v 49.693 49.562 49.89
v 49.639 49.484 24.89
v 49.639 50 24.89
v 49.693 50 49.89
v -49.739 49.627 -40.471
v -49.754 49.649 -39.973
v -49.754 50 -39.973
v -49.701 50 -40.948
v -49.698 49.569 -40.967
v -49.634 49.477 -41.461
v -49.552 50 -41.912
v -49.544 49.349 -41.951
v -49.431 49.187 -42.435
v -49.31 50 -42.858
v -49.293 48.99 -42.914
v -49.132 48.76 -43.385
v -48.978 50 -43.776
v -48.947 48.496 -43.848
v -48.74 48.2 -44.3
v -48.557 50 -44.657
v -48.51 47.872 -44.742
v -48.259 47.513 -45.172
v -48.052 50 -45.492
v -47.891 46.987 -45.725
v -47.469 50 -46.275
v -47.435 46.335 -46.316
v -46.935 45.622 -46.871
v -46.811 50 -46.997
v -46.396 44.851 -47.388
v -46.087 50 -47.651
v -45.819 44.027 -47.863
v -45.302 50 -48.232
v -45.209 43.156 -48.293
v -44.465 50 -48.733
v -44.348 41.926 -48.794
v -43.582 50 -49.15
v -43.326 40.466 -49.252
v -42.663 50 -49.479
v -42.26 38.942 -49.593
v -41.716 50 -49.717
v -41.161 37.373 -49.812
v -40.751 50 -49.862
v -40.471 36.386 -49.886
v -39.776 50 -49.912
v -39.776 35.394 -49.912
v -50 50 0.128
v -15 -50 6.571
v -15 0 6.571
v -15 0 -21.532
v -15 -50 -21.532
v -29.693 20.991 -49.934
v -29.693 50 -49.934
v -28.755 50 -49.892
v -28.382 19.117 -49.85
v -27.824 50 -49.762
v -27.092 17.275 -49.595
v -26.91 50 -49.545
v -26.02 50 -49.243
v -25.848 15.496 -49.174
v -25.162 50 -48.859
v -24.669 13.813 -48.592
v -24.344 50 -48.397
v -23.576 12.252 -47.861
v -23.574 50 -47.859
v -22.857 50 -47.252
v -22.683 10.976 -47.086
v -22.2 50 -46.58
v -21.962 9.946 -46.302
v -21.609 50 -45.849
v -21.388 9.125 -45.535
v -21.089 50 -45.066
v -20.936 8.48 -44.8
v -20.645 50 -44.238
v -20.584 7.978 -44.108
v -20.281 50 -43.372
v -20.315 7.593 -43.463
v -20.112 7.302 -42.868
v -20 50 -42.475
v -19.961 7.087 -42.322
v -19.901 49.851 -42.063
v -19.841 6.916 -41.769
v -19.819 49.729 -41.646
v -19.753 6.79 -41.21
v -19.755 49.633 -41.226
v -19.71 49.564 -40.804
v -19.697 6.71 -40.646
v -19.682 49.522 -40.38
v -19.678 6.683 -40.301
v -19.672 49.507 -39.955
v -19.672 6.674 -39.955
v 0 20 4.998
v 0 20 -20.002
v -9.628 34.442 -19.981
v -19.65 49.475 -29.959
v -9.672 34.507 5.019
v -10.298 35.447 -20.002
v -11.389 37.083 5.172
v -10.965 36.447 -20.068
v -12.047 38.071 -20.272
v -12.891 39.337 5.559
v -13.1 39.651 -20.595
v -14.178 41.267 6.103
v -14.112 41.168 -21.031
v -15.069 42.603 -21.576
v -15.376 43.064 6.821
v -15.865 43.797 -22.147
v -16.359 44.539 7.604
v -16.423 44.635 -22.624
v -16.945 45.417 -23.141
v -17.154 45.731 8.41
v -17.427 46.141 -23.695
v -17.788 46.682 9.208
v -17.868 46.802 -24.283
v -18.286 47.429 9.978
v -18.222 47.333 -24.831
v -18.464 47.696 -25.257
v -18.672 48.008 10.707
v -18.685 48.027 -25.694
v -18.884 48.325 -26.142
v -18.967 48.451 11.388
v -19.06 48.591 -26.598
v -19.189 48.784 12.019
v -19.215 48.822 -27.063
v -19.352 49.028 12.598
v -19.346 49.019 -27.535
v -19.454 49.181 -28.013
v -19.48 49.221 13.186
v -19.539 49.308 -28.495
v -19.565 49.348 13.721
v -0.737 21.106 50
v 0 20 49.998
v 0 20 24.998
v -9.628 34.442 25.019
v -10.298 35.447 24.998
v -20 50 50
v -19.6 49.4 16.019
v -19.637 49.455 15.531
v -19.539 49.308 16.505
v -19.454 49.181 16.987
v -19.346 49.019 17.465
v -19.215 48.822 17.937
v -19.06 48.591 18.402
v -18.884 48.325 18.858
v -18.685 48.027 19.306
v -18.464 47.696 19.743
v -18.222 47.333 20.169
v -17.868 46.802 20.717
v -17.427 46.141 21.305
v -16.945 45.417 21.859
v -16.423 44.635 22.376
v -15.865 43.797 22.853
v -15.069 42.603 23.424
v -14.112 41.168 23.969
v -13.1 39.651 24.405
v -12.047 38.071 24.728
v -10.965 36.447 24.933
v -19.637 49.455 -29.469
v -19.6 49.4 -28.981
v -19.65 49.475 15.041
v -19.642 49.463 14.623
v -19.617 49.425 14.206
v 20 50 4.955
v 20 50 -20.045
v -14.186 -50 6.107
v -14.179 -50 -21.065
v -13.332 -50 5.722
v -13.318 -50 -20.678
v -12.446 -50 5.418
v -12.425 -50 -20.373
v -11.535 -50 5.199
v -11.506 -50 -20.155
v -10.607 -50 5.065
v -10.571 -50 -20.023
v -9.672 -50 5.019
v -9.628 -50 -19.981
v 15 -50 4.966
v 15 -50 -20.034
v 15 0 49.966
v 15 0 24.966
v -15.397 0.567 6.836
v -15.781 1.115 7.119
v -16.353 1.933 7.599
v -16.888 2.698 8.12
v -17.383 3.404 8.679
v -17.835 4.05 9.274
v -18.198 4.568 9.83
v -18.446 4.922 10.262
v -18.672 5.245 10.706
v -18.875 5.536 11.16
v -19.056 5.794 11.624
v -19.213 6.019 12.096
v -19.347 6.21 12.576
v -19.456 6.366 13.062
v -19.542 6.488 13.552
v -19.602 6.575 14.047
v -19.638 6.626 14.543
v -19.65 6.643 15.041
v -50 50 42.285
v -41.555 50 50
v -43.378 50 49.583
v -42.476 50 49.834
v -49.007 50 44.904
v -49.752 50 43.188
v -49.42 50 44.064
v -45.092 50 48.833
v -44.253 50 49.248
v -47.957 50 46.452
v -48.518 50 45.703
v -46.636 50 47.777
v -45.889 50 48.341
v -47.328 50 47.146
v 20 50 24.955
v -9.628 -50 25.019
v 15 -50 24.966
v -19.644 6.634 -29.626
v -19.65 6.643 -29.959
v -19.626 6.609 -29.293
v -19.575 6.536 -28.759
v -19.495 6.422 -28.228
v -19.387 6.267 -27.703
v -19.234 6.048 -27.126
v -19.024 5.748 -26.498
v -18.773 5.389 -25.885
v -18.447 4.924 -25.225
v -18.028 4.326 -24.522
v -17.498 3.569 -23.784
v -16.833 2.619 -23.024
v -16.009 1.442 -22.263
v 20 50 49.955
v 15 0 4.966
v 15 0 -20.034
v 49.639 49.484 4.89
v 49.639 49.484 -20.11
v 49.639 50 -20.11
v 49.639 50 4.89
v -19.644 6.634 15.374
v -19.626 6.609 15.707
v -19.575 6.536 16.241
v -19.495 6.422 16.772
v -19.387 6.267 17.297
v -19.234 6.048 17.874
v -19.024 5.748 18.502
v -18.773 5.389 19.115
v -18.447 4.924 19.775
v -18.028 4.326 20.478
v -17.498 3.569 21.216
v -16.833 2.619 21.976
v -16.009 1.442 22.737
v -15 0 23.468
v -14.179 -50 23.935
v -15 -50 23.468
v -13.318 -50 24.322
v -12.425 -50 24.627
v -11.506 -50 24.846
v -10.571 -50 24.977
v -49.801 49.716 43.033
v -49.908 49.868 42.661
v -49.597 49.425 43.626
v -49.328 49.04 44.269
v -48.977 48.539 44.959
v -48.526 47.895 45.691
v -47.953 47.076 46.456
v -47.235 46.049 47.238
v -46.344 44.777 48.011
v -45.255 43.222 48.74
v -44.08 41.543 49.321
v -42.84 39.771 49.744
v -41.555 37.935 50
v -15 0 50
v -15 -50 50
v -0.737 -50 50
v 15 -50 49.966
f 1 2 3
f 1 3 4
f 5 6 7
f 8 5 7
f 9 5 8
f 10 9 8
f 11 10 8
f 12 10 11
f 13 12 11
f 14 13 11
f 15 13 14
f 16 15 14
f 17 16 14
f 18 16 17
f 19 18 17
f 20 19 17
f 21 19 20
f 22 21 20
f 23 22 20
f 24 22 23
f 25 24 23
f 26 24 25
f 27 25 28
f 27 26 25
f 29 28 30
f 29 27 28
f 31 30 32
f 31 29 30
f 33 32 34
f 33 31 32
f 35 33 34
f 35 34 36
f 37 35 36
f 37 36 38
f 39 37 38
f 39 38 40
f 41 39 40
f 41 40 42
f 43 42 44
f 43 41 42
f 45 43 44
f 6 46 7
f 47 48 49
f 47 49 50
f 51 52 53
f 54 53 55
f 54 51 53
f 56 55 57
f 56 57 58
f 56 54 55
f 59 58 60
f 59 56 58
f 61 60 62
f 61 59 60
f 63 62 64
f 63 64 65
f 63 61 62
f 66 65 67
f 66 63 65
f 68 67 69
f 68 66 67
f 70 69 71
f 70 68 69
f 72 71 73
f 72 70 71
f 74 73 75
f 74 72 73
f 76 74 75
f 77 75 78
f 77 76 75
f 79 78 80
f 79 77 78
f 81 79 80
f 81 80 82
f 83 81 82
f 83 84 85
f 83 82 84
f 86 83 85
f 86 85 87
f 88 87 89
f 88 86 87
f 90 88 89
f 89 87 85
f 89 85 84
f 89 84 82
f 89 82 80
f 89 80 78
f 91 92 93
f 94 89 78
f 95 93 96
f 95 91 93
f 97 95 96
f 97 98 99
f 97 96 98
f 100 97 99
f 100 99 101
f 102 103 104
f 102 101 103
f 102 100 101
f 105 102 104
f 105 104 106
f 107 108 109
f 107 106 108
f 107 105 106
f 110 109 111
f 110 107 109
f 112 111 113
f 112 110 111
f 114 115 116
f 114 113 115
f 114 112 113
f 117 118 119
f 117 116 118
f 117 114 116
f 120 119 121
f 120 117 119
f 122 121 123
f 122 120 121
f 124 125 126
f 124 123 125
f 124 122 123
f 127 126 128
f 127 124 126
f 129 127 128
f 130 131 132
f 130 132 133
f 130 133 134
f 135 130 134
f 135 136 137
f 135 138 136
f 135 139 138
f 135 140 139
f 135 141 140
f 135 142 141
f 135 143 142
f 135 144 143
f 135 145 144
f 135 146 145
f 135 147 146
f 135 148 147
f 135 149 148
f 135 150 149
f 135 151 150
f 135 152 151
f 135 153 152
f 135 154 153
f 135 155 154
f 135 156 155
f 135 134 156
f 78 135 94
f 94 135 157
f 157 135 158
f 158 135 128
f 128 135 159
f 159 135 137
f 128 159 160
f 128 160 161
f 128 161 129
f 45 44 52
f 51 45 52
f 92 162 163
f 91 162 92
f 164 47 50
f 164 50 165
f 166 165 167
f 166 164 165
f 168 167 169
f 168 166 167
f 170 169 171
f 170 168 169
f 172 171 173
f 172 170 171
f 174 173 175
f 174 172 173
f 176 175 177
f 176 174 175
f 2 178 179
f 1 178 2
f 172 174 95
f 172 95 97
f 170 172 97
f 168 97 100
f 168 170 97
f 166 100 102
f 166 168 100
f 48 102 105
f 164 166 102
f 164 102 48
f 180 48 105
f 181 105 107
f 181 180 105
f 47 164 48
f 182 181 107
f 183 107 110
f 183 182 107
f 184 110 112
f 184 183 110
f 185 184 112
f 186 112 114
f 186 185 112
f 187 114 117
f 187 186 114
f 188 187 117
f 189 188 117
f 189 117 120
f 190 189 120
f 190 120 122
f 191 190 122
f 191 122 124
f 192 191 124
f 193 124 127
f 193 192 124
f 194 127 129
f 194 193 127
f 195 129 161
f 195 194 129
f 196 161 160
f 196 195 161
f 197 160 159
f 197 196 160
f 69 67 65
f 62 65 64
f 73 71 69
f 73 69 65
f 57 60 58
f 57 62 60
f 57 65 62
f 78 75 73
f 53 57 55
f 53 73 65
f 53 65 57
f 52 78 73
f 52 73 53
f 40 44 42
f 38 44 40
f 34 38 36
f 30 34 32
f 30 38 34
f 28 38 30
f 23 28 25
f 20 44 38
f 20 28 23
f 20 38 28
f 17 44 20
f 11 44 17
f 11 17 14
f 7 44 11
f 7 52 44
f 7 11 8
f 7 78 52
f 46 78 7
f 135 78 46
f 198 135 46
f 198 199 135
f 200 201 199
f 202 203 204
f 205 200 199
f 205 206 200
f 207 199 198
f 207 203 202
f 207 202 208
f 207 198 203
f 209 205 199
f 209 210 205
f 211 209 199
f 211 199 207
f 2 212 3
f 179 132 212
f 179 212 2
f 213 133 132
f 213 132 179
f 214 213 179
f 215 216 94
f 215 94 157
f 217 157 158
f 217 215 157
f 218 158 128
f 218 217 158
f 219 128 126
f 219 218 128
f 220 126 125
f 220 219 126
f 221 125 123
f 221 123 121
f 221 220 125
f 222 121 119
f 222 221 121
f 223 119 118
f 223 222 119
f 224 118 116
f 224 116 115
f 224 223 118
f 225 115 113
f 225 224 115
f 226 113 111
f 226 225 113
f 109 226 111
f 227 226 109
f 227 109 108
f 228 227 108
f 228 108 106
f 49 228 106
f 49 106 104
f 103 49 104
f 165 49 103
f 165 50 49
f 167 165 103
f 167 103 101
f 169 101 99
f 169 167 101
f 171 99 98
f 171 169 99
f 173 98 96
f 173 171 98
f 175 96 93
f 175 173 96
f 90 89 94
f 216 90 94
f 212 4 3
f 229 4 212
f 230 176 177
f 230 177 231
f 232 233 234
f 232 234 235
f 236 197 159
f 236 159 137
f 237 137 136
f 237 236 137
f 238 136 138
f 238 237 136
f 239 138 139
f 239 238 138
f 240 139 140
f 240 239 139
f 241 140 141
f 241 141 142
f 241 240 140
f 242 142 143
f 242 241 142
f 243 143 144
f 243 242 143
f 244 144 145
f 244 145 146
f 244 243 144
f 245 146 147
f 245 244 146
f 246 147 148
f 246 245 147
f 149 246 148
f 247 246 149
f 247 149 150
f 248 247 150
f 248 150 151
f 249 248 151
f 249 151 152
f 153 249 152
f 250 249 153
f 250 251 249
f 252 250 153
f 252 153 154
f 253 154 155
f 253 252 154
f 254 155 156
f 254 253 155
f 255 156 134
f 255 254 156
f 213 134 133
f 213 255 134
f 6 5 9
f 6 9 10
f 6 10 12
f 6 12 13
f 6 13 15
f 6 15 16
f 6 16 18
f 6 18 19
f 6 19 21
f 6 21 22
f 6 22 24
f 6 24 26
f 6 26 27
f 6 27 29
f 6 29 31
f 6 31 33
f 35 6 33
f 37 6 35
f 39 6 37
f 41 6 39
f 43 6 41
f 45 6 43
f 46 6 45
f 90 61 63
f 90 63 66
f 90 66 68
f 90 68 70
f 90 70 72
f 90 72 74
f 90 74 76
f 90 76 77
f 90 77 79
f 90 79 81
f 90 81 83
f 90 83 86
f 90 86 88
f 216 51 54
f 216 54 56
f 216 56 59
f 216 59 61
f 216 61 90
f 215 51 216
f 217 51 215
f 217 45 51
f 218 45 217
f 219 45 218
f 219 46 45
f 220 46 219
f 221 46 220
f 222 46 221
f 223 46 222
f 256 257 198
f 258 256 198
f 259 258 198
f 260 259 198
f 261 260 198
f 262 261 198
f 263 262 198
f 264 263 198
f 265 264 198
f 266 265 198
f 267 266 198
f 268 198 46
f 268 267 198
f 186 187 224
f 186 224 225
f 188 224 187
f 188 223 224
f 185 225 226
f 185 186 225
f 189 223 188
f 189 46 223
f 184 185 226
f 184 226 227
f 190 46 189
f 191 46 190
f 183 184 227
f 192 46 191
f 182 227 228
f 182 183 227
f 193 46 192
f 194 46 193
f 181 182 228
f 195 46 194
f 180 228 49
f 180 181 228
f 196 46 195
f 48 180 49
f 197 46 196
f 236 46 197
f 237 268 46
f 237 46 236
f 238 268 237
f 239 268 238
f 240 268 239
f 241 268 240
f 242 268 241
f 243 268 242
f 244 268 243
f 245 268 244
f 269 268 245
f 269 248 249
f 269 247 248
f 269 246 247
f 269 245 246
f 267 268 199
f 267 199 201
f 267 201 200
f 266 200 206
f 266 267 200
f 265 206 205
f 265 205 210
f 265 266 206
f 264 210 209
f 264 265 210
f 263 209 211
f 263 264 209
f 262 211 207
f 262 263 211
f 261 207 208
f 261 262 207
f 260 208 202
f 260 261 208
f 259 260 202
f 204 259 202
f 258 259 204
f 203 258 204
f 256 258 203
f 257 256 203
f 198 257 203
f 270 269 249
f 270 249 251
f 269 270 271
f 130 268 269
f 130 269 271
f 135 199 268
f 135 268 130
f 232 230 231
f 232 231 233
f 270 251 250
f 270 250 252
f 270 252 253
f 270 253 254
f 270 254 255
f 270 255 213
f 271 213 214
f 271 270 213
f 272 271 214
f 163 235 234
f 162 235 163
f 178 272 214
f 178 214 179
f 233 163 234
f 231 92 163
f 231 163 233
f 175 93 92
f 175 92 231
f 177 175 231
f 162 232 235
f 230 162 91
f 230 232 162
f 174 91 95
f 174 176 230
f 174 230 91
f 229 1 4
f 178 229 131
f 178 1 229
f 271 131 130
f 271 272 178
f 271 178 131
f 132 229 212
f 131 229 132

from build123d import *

# Parameters (mm, degrees)
F2_DEPTH = 50
F3_DEPTH = 50


with BuildPart() as f2:
    # F0 (on Top) → F2 (new body, symmetric)
    with BuildSketch(Plane.XY):
        Polygon((-20, 50), (-50, 50), (-15, 0), (-15, -50), (15, -50), (15, 0), (50, 50), (20, 50), (0, 20), align=None)
    extrude(amount=F2_DEPTH, both=True)

    # F1 (on Front) → F3 (intersect, symmetric)
    with BuildSketch(Plane.XZ):
        with BuildLine():
            ThreePointArc((-40.222977, 50.086129), (-47.329808, 47.143242), (-50.244602, 40.024844))
            Line((-50.244602, 40.024844), (-49.754141, -39.972961))
            ThreePointArc((-49.754141, -39.972961), (-46.811419, -46.996671), (-39.776142, -49.911629))
            Line((-39.776142, -49.911629), (-29.693388, -49.933623))
            ThreePointArc((-29.693388, -49.933623), (-22.615948, -47.020121), (-19.671599, -39.955459))
            Line((-19.671599, -39.955459), (-19.649794, -29.958878))
            ThreePointArc((-19.649794, -29.958878), (-16.705445, -22.894216), (-9.628005, -19.980714))
            Line((-9.628005, -19.980714), (49.638809, -20.109991))
            Line((49.638809, -20.109991), (49.638809, 4.890009))
            Line((49.638809, 4.890009), (-9.67163, 5.019381))
            ThreePointArc((-9.67163, 5.019381), (-16.736293, 7.96373), (-19.649794, 15.04117))
            ThreePointArc((-19.649794, 15.04117), (-16.705445, 22.105832), (-9.628005, 25.019333))
            Line((-9.628005, 25.019333), (49.638809, 24.890057))
            Line((49.638809, 24.890057), (49.69334, 49.889997))
            Line((49.69334, 49.889997), (-40.222977, 50.086129))
        make_face()
    extrude(amount=F3_DEPTH, both=True, mode=Mode.INTERSECT)


solid = f2.part
